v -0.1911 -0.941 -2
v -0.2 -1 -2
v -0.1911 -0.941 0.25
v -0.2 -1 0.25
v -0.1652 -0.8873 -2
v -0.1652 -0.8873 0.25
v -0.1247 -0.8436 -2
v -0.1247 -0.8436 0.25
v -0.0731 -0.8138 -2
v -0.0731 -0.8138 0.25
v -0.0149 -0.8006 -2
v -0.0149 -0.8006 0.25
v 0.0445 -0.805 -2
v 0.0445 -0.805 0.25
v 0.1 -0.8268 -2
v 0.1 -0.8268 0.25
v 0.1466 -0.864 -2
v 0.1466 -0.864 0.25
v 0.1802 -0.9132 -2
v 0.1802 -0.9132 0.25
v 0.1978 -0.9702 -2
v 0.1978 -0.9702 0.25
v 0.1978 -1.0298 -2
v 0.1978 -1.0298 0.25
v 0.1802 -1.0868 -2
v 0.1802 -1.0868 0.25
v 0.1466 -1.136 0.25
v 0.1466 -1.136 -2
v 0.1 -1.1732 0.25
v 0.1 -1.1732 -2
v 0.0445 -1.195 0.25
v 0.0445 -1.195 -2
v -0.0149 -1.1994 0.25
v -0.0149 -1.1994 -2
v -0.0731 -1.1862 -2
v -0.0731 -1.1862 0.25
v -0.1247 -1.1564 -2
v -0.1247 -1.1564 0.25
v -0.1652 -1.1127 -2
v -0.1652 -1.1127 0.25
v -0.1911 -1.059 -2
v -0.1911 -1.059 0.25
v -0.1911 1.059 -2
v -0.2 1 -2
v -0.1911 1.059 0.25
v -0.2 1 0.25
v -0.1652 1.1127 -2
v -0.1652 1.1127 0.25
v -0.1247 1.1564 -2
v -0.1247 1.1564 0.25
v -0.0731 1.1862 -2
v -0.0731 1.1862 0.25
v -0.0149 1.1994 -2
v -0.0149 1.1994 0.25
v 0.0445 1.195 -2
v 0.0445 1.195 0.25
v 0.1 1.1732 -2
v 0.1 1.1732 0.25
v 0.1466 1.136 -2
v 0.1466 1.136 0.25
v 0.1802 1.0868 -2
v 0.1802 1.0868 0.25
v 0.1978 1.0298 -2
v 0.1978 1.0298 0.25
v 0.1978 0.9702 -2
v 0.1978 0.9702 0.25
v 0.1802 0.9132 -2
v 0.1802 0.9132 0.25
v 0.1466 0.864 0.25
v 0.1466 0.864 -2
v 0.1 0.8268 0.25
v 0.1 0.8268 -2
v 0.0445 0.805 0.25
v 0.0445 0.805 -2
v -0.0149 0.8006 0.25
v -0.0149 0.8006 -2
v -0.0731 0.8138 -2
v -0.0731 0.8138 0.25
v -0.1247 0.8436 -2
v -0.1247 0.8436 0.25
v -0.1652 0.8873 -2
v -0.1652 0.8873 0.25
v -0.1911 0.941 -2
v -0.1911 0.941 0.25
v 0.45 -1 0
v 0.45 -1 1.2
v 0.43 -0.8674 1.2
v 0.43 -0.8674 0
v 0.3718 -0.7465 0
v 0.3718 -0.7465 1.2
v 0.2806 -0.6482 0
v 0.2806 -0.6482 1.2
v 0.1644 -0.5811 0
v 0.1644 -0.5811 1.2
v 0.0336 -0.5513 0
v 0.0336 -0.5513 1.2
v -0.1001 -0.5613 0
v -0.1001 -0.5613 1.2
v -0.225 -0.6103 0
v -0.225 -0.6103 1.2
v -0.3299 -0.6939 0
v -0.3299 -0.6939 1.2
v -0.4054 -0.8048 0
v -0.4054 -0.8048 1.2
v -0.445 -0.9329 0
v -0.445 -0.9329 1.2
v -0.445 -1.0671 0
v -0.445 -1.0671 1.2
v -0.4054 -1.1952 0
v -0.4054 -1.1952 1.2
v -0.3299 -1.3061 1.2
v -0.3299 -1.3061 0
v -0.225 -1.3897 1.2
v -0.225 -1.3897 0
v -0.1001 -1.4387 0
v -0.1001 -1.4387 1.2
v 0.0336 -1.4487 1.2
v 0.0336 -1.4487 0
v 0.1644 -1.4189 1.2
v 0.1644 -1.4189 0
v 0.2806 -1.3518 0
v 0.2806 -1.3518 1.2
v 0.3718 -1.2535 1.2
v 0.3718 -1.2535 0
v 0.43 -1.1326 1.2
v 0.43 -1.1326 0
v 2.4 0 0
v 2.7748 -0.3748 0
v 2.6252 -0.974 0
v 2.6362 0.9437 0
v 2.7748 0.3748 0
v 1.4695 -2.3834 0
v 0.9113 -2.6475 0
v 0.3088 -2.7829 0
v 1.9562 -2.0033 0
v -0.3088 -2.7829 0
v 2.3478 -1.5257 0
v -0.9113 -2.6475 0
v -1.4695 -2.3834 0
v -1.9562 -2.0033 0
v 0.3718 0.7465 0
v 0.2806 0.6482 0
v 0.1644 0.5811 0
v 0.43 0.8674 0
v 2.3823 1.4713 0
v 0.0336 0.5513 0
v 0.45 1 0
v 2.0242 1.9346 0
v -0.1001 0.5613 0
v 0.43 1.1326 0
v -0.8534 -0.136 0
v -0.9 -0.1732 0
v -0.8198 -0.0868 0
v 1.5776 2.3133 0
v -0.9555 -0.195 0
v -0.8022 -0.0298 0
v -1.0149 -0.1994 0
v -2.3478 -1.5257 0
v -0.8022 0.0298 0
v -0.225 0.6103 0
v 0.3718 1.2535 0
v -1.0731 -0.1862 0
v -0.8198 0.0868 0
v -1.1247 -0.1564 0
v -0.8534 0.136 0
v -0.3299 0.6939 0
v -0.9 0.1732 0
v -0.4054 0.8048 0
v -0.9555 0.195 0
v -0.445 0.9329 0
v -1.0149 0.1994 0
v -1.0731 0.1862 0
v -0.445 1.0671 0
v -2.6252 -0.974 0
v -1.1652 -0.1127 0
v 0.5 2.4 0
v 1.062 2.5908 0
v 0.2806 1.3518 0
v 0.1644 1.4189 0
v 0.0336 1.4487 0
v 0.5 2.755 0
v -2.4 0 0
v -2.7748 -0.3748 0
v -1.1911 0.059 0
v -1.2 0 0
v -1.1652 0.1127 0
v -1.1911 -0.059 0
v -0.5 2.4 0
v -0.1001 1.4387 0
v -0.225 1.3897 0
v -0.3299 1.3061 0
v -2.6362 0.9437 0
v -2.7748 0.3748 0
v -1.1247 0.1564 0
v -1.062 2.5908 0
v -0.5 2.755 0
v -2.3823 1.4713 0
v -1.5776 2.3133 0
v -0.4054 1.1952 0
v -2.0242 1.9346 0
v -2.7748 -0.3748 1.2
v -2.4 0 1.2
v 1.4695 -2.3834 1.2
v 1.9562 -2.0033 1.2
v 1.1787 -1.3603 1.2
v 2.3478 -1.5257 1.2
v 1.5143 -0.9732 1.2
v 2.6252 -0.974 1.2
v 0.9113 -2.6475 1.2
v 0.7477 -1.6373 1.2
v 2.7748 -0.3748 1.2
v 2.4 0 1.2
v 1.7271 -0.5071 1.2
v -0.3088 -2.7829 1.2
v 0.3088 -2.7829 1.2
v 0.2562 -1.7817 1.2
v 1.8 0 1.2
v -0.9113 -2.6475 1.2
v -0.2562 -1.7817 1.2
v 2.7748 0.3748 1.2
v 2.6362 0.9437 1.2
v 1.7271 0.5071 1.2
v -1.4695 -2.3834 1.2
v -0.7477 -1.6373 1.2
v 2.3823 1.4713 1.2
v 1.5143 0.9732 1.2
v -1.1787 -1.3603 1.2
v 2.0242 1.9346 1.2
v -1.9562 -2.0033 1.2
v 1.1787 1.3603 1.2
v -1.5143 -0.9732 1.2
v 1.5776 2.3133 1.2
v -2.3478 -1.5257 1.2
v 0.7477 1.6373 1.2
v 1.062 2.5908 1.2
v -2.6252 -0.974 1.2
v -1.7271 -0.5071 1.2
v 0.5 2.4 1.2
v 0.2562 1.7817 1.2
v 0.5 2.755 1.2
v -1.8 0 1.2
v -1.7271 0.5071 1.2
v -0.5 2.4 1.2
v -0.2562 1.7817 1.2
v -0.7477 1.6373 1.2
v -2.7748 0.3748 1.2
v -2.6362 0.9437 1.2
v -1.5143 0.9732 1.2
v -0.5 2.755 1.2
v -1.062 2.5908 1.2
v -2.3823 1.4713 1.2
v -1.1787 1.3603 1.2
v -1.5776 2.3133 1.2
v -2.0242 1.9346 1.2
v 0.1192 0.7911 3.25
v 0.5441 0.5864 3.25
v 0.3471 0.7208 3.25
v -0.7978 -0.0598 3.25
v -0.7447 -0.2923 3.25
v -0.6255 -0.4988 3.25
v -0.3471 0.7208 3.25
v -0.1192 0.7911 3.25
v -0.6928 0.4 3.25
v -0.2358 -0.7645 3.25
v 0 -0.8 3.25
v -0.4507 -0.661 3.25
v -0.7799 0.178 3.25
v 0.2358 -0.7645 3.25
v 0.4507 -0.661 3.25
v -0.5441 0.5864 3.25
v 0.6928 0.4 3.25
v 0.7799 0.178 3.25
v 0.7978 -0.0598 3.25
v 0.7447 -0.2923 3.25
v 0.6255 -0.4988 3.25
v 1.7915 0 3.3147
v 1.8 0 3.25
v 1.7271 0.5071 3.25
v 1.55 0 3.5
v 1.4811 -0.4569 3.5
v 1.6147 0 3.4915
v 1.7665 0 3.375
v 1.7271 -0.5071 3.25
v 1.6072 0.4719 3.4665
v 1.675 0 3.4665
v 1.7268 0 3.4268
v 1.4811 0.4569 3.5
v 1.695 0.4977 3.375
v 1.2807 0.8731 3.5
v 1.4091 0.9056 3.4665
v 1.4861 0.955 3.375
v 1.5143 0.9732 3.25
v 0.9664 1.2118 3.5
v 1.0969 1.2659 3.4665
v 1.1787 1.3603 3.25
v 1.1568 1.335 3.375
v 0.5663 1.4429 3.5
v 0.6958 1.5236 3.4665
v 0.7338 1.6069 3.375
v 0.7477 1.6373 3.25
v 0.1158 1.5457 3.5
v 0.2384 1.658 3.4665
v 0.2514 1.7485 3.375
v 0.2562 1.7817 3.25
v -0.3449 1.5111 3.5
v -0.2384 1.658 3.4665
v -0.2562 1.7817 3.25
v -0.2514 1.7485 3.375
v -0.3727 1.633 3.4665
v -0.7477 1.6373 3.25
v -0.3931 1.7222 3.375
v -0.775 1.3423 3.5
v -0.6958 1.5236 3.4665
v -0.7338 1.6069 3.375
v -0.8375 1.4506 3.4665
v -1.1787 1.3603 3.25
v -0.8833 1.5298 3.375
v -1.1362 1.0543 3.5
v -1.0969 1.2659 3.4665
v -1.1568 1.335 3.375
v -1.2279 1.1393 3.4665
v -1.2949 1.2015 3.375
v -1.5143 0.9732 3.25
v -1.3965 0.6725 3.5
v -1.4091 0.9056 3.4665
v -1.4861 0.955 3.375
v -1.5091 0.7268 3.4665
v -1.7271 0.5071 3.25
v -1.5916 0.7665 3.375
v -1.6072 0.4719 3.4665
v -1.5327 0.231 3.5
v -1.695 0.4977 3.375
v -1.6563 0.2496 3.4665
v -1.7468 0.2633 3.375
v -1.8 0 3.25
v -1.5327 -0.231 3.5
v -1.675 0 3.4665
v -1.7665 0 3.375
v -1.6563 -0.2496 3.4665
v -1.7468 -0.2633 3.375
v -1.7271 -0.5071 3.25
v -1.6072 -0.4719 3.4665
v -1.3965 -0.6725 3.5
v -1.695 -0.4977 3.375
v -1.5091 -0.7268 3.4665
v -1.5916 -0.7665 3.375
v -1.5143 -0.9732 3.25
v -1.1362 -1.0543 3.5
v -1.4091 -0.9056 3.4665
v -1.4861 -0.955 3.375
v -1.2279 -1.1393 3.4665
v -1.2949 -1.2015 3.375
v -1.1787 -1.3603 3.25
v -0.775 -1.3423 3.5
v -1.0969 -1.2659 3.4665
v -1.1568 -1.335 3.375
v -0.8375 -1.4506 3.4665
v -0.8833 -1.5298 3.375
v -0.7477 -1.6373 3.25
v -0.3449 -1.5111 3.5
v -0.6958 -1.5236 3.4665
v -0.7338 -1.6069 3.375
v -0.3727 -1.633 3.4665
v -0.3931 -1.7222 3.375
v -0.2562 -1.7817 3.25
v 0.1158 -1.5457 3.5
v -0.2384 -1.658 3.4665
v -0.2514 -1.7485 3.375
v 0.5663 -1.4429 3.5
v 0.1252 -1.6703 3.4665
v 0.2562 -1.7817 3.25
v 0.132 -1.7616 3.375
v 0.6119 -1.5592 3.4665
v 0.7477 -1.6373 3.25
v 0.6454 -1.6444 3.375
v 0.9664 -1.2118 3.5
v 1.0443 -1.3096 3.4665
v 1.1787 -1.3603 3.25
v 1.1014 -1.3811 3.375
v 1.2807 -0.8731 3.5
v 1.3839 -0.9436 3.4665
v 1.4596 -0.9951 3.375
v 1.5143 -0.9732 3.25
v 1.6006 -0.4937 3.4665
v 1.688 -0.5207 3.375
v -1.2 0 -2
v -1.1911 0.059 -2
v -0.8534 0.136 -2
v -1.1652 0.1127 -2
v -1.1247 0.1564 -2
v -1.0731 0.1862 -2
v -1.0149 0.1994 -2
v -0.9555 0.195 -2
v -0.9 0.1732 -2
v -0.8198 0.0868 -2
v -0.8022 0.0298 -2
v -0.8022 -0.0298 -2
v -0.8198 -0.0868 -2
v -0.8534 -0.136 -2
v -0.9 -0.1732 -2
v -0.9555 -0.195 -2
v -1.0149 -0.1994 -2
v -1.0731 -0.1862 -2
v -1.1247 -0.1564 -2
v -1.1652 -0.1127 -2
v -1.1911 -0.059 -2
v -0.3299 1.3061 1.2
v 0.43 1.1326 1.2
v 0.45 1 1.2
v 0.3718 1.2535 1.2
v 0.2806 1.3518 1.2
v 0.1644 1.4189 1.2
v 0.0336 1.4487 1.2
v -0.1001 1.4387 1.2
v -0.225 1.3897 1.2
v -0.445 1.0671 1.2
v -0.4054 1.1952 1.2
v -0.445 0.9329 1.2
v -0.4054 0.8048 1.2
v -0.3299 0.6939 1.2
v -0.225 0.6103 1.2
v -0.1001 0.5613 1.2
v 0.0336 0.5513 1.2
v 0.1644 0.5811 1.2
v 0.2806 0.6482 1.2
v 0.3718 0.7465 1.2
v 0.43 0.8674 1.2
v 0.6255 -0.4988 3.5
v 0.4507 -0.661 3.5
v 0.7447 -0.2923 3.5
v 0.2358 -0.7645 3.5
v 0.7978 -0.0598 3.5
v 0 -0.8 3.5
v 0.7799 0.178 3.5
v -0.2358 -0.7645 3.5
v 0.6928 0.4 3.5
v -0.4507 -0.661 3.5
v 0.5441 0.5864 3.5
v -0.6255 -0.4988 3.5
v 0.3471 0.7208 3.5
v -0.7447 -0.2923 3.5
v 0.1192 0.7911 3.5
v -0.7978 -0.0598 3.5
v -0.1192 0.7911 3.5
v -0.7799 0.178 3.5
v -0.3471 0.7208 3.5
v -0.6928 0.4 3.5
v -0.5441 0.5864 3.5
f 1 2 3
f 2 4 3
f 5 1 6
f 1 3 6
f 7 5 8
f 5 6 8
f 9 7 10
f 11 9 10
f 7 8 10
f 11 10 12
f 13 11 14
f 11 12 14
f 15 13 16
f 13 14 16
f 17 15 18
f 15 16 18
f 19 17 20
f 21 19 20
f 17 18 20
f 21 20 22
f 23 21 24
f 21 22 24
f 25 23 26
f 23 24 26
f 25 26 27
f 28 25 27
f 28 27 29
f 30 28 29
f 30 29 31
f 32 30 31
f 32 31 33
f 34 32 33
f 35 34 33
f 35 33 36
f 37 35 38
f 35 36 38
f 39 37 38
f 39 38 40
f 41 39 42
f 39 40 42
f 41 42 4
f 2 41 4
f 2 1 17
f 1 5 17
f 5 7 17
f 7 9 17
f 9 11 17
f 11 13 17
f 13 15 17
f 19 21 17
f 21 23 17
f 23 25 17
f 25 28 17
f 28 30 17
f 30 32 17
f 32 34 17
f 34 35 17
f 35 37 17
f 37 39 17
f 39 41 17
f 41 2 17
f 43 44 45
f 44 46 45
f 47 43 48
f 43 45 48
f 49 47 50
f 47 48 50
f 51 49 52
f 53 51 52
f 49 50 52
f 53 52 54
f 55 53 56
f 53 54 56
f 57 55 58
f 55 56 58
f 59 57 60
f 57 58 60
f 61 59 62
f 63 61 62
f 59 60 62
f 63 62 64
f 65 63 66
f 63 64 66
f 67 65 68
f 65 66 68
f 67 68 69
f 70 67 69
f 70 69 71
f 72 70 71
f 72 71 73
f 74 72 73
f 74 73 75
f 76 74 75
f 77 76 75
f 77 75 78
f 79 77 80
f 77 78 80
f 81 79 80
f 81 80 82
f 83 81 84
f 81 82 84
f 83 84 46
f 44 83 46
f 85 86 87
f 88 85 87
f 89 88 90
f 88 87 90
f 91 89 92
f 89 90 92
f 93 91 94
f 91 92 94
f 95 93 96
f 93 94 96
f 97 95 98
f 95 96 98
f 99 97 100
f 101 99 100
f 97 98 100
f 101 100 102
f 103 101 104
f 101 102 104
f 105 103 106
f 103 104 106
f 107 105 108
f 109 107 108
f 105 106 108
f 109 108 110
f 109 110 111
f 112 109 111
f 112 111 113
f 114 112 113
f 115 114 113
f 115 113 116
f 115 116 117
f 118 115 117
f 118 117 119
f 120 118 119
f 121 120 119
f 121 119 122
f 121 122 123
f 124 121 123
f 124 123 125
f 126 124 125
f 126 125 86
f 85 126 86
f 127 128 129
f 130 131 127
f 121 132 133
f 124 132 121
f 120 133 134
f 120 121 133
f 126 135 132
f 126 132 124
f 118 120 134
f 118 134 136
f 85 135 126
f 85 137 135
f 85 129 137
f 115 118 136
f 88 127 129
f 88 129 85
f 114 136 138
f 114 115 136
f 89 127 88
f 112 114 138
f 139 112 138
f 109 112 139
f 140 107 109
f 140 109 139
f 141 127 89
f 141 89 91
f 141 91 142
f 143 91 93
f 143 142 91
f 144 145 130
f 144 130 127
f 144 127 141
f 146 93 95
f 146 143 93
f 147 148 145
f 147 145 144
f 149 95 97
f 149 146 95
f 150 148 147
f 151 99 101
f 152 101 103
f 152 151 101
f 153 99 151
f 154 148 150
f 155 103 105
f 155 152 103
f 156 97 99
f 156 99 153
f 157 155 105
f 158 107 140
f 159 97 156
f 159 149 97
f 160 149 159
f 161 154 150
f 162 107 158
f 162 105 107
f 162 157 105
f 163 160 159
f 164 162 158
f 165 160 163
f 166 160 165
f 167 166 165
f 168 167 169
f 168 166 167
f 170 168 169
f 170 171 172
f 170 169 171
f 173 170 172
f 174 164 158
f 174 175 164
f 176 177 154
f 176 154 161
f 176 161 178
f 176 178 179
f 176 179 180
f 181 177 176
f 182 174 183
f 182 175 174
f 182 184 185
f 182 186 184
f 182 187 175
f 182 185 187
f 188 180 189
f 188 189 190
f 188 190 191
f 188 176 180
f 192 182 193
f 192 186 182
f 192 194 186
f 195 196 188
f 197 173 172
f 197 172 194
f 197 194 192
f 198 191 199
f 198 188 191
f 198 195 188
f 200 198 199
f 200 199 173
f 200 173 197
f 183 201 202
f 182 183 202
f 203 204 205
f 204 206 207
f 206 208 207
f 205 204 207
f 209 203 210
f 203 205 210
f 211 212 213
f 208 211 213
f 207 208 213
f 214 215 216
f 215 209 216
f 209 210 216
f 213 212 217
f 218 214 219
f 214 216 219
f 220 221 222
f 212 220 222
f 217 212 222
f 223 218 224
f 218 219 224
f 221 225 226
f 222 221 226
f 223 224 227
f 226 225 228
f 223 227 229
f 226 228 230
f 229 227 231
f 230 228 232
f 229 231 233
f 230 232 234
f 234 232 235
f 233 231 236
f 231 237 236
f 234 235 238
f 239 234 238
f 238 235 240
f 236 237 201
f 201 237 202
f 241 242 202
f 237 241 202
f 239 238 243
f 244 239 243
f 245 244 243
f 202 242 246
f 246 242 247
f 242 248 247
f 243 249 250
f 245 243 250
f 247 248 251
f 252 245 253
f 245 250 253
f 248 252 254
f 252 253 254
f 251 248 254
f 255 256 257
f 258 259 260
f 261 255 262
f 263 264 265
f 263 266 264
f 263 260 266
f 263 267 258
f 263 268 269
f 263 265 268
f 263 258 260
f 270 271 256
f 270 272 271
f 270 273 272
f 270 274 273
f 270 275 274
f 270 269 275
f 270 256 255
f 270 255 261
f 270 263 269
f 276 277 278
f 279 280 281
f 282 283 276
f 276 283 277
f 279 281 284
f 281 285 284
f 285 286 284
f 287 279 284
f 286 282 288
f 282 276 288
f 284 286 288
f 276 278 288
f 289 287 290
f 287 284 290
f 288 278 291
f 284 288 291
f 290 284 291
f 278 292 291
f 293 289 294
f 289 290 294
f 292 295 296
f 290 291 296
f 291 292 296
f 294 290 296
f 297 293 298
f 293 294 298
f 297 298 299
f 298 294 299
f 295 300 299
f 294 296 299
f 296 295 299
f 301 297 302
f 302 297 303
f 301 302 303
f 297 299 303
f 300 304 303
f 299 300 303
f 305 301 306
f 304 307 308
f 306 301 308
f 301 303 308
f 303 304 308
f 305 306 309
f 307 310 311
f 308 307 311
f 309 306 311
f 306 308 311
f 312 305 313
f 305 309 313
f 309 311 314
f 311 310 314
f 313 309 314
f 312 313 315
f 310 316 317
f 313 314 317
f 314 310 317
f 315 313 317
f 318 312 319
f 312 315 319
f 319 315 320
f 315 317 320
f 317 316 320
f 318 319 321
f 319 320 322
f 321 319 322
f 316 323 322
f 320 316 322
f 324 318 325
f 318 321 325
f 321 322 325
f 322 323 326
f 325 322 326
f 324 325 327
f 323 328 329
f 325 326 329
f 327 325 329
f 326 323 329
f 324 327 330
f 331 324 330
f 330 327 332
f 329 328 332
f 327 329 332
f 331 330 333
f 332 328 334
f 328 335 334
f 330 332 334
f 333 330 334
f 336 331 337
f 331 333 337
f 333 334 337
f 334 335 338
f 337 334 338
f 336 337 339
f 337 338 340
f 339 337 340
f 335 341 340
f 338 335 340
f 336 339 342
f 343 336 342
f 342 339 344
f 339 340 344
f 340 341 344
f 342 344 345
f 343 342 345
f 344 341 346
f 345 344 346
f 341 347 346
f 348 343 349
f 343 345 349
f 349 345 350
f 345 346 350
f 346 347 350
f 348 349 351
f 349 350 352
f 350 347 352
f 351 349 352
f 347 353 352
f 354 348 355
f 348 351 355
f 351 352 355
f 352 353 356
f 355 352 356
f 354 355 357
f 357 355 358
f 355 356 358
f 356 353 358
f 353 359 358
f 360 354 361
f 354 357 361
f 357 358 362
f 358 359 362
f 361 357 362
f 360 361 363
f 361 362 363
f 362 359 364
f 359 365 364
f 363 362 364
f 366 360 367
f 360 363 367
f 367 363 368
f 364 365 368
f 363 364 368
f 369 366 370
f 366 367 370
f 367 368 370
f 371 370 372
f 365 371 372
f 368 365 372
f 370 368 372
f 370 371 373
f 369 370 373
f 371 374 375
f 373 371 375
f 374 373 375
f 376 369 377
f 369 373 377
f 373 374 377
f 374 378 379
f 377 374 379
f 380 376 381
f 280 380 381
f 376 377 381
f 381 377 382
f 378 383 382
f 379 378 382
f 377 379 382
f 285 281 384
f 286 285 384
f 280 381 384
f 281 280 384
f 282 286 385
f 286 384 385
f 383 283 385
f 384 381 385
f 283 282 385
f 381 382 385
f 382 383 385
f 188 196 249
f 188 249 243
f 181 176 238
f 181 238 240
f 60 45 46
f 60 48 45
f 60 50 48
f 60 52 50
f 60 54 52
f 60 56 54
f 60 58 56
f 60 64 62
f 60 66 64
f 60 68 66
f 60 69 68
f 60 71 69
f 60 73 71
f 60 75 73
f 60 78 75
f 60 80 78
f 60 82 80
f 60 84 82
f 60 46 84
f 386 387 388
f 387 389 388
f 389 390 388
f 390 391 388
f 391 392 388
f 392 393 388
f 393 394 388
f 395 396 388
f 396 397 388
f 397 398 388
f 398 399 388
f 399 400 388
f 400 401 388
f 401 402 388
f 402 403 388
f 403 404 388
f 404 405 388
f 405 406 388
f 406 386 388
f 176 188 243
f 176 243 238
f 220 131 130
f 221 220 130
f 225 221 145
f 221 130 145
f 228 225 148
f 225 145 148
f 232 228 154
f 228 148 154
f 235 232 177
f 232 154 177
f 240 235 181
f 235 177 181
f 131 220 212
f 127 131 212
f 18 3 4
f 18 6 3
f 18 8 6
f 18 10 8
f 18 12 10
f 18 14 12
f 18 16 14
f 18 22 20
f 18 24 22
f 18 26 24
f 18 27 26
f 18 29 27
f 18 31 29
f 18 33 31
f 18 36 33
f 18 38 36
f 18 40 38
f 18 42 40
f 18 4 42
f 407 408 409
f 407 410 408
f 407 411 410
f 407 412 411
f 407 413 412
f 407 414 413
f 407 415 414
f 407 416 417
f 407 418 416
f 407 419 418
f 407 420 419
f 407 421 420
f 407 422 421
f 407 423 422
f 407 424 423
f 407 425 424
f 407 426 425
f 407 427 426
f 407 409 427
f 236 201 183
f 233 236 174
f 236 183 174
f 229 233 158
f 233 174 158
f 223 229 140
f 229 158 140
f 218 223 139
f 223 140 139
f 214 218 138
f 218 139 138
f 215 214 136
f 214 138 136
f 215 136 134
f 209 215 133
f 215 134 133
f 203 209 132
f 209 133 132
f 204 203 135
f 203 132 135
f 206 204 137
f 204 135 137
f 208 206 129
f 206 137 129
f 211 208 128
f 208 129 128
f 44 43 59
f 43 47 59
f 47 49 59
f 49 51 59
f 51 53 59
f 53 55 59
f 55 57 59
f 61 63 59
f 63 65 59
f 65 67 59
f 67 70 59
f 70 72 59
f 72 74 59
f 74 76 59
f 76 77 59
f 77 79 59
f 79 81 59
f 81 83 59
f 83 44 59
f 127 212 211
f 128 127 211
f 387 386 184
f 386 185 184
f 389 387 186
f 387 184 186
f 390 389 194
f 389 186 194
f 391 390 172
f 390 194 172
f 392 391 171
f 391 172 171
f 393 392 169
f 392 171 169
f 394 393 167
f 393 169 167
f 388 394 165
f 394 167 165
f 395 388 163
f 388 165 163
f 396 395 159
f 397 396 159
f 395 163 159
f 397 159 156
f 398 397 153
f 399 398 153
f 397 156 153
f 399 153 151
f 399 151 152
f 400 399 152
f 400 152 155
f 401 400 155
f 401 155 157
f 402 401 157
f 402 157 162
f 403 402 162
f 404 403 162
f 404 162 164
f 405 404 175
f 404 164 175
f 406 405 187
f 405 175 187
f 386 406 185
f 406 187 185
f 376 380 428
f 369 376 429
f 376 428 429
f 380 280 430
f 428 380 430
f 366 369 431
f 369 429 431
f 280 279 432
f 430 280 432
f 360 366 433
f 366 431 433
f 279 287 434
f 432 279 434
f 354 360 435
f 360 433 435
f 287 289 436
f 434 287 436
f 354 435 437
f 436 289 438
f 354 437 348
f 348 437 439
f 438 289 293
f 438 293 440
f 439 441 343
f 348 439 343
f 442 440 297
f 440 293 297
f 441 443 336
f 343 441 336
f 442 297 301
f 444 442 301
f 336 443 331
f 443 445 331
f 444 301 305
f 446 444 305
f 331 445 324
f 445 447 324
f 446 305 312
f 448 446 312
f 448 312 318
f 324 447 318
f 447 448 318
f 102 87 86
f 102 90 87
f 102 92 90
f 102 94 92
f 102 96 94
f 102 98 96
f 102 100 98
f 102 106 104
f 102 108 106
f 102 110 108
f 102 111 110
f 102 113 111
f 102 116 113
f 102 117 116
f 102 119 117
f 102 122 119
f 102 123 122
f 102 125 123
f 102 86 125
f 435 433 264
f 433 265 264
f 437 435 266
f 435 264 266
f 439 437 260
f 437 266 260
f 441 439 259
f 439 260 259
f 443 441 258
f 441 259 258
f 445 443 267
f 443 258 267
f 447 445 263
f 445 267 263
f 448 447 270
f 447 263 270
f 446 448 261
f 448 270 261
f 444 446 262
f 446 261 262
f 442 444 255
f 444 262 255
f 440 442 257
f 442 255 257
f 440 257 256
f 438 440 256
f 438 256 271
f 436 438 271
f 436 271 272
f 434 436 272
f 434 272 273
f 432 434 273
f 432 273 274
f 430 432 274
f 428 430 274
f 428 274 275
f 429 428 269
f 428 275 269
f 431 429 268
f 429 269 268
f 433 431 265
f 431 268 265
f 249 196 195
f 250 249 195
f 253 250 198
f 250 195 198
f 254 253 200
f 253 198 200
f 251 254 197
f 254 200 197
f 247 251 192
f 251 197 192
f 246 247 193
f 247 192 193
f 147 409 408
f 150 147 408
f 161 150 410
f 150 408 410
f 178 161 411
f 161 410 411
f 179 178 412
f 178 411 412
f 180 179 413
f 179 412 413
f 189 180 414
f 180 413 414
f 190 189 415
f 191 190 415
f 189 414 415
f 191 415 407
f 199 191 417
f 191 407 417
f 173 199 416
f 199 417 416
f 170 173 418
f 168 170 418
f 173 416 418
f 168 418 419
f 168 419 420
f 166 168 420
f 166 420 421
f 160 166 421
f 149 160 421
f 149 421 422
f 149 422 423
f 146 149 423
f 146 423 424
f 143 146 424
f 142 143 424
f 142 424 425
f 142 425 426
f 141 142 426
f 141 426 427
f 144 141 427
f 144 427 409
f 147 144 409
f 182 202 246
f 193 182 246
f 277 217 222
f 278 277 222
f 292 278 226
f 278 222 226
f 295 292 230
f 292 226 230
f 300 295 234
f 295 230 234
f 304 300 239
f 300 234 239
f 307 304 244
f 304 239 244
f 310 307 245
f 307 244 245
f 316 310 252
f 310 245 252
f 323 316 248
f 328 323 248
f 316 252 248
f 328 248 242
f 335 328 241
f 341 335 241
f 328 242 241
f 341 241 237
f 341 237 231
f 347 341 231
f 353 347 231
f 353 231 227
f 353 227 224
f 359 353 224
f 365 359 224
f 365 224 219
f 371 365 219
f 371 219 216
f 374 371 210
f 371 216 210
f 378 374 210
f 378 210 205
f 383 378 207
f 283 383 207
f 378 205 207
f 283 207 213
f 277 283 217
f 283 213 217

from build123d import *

# Parameters (mm, degrees)
SKETCH1_W                  = 2.8
SKETCH1_H                  = 1.2
CUT_EXTRUDE1_DEPTH         = 5.137632173
CUT_EXTRUDE2_DEPTH         = 5.137632173
CUT_EXTRUDE3_START         = -1.2
CUT_EXTRUDE3_DEPTH         = 1.2
F_0_9_0_9_DIAMETER_HOLE1_D = 0.9
F_0_9_0_9_DIAMETER_HOLE2_D = 0.9
SKETCH9_W                  = 1.8
SKETCH9_H                  = 2.3
SKETCH10_W                 = 0.2
SKETCH10_H                 = 2
SKETCH11_W                 = 0.2
SKETCH11_H                 = 2.25
SKETCH12_W                 = 0.2
SKETCH12_H                 = 2.25
SKETCH13_W                 = 0.8
SKETCH13_H                 = 0.25
FILLET1_R                  = 0.25


with BuildPart() as part:
    # Sketch1 → Revolve1 (revolve)
    with BuildSketch(Plane(origin=(0, 0, 0), x_dir=(1, 0, 0), z_dir=(0, 1, 0))):
        with Locations((1.4, -0.6)):
            Rectangle(SKETCH1_W, SKETCH1_H)
    revolve(axis=Axis((0, 0, 0), (0, 0, 1)))

    # Sketch2 → Cut-Extrude1 (cut, through all)
    with BuildSketch(Plane.XY.offset(1.2)):
        with BuildLine():
            Line((2.774801575, 0.374801575), (2.4, 0))
            Line((2.4, 0), (2.774801575, -0.374801575))
            ThreePointArc((2.774801575, -0.374801575), (2.8, 0), (2.774801575, 0.374801575))
        make_face()
    extrude(amount=-CUT_EXTRUDE1_DEPTH, mode=Mode.SUBTRACT)

    # Sketch3 → Cut-Extrude2 (cut, through all)
    with BuildSketch(Plane.XY.offset(1.2)):
        with BuildLine():
            Line((-2.774801575, -0.374801575), (-2.4, 0))
            Line((-2.4, 0), (-2.774801575, 0.374801575))
            ThreePointArc((-2.774801575, 0.374801575), (-2.8, 0), (-2.774801575, -0.374801575))
        make_face()
    extrude(amount=-CUT_EXTRUDE2_DEPTH, mode=Mode.SUBTRACT)

    # Sketch4 → Cut-Extrude3 (cut)
    with BuildSketch(Plane.XY.offset(1.2).offset(CUT_EXTRUDE3_START)):
        with BuildLine():
            Line((-0.5, 2.754995463), (-0.5, 2.4))
            Line((-0.5, 2.4), (0.5, 2.4))
            Line((0.5, 2.4), (0.5, 2.754995463))
            ThreePointArc((0.5, 2.754995463), (0, 2.8), (-0.5, 2.754995463))
        make_face()
    extrude(amount=CUT_EXTRUDE3_DEPTH, mode=Mode.SUBTRACT)

    # Ø0.9 (0.9) Diameter Hole1 (through all)
    with Locations(Plane(origin=(0, 0, 0), x_dir=(-1, 0, 0), z_dir=(0, 0, -1))):
        with Locations((0, 1)):
            Hole(F_0_9_0_9_DIAMETER_HOLE1_D / 2)

    # Ø0.9 (0.9) Diameter Hole2 (through all)
    with Locations(Plane(origin=(0, 0, 0), x_dir=(-1, 0, 0), z_dir=(0, 0, -1))):
        with Locations((0, -1)):
            Hole(F_0_9_0_9_DIAMETER_HOLE2_D / 2)

    # Sketch9 → Revolve2 (revolve)
    with BuildSketch(Plane(origin=(0, 0, 0), x_dir=(1, 0, 0), z_dir=(0, 1, 0))):
        with Locations((0.9, -2.35)):
            Rectangle(SKETCH9_W, SKETCH9_H)
    revolve(axis=Axis((0, 0, 1.2), (0, 0, 1)))

    # Sketch10 → Revolve3 (revolve)
    with BuildSketch(Plane.XZ, mode=Mode.PRIVATE) as revolve3_sk:
        with Locations((-0.9, -1)):
            Rectangle(SKETCH10_W, SKETCH10_H)
    revolve(revolve3_sk.sketch.rotate(Axis((-1, 0, 0), (0, 0, -1)), 180), axis=Axis((-1, 0, 0), (0, 0, -1)))

    # Sketch13 → Ø1.6 (1.6) Diameter Hole1 (revolve, cut)
    with BuildSketch(Plane(origin=(0, 0, 3.5), x_dir=(0, -1, 0), z_dir=(1, 0, 0))):
        with Locations((0.4, 0.125)):
            Rectangle(SKETCH13_W, SKETCH13_H)
    revolve(axis=Axis((0, 0, 9.85), (0, 0, -1)), mode=Mode.SUBTRACT)

    # Fillet1
    fillet1_edges = [part.edges().sort_by_distance(p)[0] for p in [
        (-1.8, 0, 3.5),
    ]]
    fillet(fillet1_edges, radius=FILLET1_R)


with BuildPart() as body_2:
    # Sketch11 → Revolve4 (revolve)
    with BuildSketch(Plane.XZ.offset(1), mode=Mode.PRIVATE) as revolve4_sk:
        with Locations((0.1, -0.875)):
            Rectangle(SKETCH11_W, SKETCH11_H)
    revolve(revolve4_sk.sketch.rotate(Axis((0, -1, 0.25), (0, 0, -1)), 180), axis=Axis((0, -1, 0.25), (0, 0, -1)))


with BuildPart() as body_3:
    # Sketch12 → Revolve5 (revolve)
    with BuildSketch(Plane.XZ.offset(-1), mode=Mode.PRIVATE) as revolve5_sk:
        with Locations((0.1, -0.875)):
            Rectangle(SKETCH12_W, SKETCH12_H)
    revolve(revolve5_sk.sketch.rotate(Axis((0, 1, 0.25), (0, 0, -1)), 180), axis=Axis((0, 1, 0.25), (0, 0, -1)))


solid = Compound([part.part, body_2.part, body_3.part])
